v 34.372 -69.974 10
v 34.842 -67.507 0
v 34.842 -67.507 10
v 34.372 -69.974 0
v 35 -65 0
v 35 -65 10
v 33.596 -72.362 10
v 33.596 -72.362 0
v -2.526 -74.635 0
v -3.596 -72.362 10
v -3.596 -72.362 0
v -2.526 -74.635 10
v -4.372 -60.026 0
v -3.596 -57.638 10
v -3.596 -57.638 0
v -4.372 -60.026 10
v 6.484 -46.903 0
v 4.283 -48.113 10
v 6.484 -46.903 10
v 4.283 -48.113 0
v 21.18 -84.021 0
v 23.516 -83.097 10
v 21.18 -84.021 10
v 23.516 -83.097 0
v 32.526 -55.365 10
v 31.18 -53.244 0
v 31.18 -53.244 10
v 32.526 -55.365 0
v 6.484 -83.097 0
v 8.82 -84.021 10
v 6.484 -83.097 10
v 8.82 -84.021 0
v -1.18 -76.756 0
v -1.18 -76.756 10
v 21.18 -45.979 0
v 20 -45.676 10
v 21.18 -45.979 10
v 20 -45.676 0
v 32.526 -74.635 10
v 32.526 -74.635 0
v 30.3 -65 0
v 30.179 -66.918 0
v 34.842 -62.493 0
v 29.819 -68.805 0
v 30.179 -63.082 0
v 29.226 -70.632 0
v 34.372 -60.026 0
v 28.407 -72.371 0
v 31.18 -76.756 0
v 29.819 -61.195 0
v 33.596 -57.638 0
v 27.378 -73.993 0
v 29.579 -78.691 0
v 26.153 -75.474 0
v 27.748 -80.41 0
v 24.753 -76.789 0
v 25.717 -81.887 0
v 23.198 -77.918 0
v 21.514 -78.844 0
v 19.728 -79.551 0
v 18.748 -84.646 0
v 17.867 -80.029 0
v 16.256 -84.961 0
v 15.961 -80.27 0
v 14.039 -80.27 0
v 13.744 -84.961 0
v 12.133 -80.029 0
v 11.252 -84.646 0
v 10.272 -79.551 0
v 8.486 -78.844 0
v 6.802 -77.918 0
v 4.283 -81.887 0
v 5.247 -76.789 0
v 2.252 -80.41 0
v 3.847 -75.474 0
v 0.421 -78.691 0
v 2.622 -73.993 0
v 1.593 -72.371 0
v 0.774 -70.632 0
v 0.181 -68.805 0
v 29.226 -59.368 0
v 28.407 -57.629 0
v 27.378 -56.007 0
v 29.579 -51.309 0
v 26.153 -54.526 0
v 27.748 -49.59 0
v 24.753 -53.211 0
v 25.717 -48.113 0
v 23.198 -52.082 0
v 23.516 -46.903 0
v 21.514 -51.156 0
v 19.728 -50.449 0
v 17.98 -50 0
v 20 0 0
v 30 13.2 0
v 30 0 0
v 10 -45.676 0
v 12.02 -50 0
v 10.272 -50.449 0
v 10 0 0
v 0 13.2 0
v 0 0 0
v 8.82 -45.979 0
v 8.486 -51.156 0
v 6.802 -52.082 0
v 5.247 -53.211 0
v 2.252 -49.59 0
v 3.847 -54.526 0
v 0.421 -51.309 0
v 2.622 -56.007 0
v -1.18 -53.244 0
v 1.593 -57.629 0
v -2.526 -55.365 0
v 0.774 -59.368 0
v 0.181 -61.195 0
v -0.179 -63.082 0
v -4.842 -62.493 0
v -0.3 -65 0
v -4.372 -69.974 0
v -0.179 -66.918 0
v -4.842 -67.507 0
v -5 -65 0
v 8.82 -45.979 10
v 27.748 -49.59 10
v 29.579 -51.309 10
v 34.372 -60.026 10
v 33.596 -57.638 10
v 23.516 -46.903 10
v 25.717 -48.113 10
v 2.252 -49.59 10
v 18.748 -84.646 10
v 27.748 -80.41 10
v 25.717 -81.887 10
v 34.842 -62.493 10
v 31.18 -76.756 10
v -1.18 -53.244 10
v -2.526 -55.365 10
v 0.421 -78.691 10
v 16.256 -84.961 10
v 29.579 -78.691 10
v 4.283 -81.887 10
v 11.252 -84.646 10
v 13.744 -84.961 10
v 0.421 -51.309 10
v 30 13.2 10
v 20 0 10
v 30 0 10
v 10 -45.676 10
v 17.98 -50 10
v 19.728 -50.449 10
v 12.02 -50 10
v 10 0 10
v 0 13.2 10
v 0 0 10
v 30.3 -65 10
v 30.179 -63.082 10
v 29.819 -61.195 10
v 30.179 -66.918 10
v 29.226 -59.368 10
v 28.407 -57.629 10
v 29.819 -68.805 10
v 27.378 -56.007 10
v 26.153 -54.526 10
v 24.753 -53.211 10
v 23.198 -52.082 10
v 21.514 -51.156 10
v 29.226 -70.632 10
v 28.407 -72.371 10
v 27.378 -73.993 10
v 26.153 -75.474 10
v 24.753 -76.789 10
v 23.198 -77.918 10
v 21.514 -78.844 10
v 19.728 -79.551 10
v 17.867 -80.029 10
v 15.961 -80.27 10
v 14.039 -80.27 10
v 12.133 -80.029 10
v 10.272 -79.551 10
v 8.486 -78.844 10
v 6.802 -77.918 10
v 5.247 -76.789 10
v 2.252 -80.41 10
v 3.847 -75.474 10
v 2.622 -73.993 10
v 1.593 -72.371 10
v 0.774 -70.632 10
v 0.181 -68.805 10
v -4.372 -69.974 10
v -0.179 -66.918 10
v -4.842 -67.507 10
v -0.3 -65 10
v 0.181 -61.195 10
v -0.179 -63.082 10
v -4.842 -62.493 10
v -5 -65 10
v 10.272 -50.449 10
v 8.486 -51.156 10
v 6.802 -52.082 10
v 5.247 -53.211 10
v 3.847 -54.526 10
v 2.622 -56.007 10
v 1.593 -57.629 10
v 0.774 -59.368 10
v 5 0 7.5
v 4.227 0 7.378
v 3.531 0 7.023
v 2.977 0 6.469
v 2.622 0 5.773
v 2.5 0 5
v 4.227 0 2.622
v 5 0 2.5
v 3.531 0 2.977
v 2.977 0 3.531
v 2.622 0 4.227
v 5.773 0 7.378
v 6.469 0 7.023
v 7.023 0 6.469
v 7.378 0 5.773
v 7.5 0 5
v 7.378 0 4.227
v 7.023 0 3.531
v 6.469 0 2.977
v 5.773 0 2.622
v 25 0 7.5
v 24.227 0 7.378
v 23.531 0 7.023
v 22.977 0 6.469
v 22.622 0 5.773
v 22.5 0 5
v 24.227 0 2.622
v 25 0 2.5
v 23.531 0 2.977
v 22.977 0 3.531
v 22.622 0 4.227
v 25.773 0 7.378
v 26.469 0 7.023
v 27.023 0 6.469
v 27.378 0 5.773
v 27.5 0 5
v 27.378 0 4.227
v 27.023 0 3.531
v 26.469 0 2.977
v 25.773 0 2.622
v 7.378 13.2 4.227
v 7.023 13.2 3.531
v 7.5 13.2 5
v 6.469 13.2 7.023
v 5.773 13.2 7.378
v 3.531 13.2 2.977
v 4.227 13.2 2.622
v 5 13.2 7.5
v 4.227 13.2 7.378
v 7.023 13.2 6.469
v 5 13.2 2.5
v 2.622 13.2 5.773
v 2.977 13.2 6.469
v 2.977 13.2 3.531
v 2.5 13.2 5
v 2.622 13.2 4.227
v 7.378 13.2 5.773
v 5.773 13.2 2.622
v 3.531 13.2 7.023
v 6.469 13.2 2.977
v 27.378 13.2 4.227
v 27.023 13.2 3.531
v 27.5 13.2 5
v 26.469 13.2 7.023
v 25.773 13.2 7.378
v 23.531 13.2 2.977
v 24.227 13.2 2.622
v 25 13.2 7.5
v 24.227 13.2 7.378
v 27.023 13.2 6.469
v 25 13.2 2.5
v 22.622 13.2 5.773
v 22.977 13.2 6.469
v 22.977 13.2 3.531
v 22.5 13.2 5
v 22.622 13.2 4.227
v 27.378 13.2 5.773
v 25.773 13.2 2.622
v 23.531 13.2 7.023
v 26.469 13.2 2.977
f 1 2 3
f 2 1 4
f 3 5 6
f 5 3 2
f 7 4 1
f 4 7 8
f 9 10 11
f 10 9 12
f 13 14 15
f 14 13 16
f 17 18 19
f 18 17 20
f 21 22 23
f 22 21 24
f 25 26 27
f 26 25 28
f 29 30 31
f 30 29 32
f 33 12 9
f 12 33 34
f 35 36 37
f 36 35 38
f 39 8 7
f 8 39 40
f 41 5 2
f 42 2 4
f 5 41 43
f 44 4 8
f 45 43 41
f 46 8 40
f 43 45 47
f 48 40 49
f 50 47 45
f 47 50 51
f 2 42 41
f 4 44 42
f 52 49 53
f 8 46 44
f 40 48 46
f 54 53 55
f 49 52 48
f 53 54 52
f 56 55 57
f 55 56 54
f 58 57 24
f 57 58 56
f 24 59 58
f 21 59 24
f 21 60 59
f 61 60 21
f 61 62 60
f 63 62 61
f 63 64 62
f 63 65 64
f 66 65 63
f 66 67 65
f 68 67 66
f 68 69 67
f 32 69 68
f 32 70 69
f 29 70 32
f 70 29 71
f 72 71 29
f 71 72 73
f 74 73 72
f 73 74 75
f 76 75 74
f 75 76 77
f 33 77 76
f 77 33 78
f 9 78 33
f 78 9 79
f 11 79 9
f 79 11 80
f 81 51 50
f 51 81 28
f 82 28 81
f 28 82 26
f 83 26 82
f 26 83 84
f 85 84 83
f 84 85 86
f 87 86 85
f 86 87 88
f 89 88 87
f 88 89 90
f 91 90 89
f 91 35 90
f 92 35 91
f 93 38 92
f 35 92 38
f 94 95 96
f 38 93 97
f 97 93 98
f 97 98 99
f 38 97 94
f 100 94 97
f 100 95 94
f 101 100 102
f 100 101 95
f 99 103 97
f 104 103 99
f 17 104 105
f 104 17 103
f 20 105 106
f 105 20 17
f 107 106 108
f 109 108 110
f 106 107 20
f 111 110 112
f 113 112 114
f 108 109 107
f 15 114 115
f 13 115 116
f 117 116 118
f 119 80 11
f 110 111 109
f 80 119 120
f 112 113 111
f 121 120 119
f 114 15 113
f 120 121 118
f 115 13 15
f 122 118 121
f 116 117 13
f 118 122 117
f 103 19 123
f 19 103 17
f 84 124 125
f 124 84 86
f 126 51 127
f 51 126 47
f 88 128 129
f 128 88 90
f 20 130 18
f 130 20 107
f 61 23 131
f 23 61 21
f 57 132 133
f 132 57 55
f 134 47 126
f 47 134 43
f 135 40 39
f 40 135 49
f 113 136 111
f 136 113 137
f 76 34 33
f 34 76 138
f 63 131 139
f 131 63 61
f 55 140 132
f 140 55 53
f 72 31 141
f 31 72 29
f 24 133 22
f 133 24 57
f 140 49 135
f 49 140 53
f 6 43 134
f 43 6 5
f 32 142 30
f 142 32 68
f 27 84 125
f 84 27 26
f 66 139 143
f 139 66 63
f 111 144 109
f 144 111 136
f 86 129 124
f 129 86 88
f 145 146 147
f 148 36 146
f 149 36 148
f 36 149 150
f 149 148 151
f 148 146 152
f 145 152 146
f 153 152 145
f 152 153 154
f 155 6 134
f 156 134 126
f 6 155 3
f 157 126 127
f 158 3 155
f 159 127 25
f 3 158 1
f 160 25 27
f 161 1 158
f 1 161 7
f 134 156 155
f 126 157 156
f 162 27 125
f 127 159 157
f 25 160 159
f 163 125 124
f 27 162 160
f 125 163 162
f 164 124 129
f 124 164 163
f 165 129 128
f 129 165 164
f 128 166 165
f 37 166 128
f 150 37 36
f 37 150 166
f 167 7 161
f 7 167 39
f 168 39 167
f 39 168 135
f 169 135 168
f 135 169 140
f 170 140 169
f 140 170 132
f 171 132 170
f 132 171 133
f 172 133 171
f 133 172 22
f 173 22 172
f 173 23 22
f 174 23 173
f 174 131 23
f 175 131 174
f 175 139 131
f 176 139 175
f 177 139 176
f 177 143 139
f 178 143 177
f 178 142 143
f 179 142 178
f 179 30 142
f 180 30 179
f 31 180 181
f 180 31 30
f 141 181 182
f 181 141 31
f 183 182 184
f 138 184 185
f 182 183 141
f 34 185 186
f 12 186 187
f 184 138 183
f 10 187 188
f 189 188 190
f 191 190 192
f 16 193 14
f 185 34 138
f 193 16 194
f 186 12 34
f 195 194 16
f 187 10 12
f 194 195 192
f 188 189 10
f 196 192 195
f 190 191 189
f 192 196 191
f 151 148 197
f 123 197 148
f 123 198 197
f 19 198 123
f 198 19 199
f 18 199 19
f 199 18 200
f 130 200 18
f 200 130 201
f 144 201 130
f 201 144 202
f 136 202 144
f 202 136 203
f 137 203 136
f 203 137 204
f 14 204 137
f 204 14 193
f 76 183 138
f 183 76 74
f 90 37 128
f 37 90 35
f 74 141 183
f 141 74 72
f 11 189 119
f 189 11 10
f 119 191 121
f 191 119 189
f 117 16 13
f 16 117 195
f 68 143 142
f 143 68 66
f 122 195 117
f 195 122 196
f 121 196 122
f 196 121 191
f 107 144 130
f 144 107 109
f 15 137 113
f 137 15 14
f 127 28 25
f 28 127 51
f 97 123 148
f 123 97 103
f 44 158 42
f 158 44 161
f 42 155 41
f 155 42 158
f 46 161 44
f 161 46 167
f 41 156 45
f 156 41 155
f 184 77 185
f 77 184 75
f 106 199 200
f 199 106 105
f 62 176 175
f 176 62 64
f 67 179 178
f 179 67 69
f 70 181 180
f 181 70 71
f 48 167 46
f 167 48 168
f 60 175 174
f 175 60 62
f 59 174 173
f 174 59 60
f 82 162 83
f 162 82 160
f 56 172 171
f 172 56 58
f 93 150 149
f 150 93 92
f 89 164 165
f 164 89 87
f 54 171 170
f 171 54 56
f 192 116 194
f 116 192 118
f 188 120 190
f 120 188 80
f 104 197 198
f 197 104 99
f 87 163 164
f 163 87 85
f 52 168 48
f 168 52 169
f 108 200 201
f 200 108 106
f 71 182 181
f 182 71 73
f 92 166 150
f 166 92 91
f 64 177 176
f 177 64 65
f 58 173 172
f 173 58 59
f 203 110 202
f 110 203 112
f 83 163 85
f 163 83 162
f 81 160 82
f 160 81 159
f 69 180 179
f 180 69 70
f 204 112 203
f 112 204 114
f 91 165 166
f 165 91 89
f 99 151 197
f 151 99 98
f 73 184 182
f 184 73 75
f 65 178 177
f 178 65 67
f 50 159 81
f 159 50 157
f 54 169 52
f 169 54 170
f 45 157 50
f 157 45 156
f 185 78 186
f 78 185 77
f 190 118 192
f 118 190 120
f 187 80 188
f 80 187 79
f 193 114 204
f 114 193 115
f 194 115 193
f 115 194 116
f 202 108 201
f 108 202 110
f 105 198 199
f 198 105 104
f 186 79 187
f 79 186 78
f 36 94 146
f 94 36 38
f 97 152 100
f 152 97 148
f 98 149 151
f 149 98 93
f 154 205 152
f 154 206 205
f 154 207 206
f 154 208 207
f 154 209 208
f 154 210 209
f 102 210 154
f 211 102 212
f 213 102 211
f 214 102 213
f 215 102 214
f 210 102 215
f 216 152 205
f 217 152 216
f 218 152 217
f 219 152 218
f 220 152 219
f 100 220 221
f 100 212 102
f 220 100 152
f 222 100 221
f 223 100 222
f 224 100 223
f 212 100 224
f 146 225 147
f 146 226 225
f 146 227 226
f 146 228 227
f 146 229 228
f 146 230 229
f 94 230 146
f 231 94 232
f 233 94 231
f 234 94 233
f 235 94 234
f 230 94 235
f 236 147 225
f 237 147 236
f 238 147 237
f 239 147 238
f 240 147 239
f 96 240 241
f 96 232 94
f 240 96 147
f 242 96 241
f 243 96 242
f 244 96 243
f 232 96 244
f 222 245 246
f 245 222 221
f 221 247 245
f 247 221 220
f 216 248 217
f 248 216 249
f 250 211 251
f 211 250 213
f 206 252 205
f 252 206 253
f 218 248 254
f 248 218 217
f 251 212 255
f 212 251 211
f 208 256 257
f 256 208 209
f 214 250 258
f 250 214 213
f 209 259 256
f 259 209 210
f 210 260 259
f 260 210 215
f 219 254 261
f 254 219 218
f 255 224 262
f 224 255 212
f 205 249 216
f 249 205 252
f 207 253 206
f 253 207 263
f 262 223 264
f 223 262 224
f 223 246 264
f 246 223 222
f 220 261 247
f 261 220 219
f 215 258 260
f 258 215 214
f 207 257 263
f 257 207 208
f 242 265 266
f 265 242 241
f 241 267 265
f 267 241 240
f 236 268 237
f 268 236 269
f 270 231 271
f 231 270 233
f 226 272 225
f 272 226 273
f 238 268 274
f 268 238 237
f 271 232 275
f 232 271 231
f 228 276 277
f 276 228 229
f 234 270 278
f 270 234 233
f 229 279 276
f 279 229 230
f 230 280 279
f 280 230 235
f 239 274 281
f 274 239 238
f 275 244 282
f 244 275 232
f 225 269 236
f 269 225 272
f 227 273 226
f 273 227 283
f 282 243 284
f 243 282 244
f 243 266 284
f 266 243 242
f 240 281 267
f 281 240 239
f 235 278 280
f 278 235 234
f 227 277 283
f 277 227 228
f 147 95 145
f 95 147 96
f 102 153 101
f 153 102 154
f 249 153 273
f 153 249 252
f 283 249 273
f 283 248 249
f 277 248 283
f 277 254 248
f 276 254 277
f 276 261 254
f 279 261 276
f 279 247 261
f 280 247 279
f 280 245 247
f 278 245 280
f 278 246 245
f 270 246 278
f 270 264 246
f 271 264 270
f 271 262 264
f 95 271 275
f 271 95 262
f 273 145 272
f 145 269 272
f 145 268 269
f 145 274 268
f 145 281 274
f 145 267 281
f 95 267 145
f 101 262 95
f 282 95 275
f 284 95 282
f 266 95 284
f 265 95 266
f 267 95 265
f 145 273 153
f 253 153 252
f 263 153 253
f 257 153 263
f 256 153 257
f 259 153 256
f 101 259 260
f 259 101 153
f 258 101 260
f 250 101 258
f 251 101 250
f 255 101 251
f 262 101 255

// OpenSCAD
union() {
    rotate(180, [1,0,0]) {

    translate([10,0,-10]) {
        cube([10,50,10]);
    }
    
    translate([15,65,-10]) {
        difference() {
            cylinder(r=20,h=10,$fn=50);
            cylinder(r=15.3,h=10,$fn=50);
        }
    }
}
    difference() {
        cube([30,13.2,10]);
        union() {
            rotate(-90, [1,0,0]) {
                translate([5,-5,0]) {
                    cylinder(d=5,h=50,$fn=20);
                }
                translate([30-5,-5,0]) {
                    cylinder(d=5,h=50,$fn=20);
                }
            }
        }
    }
}
